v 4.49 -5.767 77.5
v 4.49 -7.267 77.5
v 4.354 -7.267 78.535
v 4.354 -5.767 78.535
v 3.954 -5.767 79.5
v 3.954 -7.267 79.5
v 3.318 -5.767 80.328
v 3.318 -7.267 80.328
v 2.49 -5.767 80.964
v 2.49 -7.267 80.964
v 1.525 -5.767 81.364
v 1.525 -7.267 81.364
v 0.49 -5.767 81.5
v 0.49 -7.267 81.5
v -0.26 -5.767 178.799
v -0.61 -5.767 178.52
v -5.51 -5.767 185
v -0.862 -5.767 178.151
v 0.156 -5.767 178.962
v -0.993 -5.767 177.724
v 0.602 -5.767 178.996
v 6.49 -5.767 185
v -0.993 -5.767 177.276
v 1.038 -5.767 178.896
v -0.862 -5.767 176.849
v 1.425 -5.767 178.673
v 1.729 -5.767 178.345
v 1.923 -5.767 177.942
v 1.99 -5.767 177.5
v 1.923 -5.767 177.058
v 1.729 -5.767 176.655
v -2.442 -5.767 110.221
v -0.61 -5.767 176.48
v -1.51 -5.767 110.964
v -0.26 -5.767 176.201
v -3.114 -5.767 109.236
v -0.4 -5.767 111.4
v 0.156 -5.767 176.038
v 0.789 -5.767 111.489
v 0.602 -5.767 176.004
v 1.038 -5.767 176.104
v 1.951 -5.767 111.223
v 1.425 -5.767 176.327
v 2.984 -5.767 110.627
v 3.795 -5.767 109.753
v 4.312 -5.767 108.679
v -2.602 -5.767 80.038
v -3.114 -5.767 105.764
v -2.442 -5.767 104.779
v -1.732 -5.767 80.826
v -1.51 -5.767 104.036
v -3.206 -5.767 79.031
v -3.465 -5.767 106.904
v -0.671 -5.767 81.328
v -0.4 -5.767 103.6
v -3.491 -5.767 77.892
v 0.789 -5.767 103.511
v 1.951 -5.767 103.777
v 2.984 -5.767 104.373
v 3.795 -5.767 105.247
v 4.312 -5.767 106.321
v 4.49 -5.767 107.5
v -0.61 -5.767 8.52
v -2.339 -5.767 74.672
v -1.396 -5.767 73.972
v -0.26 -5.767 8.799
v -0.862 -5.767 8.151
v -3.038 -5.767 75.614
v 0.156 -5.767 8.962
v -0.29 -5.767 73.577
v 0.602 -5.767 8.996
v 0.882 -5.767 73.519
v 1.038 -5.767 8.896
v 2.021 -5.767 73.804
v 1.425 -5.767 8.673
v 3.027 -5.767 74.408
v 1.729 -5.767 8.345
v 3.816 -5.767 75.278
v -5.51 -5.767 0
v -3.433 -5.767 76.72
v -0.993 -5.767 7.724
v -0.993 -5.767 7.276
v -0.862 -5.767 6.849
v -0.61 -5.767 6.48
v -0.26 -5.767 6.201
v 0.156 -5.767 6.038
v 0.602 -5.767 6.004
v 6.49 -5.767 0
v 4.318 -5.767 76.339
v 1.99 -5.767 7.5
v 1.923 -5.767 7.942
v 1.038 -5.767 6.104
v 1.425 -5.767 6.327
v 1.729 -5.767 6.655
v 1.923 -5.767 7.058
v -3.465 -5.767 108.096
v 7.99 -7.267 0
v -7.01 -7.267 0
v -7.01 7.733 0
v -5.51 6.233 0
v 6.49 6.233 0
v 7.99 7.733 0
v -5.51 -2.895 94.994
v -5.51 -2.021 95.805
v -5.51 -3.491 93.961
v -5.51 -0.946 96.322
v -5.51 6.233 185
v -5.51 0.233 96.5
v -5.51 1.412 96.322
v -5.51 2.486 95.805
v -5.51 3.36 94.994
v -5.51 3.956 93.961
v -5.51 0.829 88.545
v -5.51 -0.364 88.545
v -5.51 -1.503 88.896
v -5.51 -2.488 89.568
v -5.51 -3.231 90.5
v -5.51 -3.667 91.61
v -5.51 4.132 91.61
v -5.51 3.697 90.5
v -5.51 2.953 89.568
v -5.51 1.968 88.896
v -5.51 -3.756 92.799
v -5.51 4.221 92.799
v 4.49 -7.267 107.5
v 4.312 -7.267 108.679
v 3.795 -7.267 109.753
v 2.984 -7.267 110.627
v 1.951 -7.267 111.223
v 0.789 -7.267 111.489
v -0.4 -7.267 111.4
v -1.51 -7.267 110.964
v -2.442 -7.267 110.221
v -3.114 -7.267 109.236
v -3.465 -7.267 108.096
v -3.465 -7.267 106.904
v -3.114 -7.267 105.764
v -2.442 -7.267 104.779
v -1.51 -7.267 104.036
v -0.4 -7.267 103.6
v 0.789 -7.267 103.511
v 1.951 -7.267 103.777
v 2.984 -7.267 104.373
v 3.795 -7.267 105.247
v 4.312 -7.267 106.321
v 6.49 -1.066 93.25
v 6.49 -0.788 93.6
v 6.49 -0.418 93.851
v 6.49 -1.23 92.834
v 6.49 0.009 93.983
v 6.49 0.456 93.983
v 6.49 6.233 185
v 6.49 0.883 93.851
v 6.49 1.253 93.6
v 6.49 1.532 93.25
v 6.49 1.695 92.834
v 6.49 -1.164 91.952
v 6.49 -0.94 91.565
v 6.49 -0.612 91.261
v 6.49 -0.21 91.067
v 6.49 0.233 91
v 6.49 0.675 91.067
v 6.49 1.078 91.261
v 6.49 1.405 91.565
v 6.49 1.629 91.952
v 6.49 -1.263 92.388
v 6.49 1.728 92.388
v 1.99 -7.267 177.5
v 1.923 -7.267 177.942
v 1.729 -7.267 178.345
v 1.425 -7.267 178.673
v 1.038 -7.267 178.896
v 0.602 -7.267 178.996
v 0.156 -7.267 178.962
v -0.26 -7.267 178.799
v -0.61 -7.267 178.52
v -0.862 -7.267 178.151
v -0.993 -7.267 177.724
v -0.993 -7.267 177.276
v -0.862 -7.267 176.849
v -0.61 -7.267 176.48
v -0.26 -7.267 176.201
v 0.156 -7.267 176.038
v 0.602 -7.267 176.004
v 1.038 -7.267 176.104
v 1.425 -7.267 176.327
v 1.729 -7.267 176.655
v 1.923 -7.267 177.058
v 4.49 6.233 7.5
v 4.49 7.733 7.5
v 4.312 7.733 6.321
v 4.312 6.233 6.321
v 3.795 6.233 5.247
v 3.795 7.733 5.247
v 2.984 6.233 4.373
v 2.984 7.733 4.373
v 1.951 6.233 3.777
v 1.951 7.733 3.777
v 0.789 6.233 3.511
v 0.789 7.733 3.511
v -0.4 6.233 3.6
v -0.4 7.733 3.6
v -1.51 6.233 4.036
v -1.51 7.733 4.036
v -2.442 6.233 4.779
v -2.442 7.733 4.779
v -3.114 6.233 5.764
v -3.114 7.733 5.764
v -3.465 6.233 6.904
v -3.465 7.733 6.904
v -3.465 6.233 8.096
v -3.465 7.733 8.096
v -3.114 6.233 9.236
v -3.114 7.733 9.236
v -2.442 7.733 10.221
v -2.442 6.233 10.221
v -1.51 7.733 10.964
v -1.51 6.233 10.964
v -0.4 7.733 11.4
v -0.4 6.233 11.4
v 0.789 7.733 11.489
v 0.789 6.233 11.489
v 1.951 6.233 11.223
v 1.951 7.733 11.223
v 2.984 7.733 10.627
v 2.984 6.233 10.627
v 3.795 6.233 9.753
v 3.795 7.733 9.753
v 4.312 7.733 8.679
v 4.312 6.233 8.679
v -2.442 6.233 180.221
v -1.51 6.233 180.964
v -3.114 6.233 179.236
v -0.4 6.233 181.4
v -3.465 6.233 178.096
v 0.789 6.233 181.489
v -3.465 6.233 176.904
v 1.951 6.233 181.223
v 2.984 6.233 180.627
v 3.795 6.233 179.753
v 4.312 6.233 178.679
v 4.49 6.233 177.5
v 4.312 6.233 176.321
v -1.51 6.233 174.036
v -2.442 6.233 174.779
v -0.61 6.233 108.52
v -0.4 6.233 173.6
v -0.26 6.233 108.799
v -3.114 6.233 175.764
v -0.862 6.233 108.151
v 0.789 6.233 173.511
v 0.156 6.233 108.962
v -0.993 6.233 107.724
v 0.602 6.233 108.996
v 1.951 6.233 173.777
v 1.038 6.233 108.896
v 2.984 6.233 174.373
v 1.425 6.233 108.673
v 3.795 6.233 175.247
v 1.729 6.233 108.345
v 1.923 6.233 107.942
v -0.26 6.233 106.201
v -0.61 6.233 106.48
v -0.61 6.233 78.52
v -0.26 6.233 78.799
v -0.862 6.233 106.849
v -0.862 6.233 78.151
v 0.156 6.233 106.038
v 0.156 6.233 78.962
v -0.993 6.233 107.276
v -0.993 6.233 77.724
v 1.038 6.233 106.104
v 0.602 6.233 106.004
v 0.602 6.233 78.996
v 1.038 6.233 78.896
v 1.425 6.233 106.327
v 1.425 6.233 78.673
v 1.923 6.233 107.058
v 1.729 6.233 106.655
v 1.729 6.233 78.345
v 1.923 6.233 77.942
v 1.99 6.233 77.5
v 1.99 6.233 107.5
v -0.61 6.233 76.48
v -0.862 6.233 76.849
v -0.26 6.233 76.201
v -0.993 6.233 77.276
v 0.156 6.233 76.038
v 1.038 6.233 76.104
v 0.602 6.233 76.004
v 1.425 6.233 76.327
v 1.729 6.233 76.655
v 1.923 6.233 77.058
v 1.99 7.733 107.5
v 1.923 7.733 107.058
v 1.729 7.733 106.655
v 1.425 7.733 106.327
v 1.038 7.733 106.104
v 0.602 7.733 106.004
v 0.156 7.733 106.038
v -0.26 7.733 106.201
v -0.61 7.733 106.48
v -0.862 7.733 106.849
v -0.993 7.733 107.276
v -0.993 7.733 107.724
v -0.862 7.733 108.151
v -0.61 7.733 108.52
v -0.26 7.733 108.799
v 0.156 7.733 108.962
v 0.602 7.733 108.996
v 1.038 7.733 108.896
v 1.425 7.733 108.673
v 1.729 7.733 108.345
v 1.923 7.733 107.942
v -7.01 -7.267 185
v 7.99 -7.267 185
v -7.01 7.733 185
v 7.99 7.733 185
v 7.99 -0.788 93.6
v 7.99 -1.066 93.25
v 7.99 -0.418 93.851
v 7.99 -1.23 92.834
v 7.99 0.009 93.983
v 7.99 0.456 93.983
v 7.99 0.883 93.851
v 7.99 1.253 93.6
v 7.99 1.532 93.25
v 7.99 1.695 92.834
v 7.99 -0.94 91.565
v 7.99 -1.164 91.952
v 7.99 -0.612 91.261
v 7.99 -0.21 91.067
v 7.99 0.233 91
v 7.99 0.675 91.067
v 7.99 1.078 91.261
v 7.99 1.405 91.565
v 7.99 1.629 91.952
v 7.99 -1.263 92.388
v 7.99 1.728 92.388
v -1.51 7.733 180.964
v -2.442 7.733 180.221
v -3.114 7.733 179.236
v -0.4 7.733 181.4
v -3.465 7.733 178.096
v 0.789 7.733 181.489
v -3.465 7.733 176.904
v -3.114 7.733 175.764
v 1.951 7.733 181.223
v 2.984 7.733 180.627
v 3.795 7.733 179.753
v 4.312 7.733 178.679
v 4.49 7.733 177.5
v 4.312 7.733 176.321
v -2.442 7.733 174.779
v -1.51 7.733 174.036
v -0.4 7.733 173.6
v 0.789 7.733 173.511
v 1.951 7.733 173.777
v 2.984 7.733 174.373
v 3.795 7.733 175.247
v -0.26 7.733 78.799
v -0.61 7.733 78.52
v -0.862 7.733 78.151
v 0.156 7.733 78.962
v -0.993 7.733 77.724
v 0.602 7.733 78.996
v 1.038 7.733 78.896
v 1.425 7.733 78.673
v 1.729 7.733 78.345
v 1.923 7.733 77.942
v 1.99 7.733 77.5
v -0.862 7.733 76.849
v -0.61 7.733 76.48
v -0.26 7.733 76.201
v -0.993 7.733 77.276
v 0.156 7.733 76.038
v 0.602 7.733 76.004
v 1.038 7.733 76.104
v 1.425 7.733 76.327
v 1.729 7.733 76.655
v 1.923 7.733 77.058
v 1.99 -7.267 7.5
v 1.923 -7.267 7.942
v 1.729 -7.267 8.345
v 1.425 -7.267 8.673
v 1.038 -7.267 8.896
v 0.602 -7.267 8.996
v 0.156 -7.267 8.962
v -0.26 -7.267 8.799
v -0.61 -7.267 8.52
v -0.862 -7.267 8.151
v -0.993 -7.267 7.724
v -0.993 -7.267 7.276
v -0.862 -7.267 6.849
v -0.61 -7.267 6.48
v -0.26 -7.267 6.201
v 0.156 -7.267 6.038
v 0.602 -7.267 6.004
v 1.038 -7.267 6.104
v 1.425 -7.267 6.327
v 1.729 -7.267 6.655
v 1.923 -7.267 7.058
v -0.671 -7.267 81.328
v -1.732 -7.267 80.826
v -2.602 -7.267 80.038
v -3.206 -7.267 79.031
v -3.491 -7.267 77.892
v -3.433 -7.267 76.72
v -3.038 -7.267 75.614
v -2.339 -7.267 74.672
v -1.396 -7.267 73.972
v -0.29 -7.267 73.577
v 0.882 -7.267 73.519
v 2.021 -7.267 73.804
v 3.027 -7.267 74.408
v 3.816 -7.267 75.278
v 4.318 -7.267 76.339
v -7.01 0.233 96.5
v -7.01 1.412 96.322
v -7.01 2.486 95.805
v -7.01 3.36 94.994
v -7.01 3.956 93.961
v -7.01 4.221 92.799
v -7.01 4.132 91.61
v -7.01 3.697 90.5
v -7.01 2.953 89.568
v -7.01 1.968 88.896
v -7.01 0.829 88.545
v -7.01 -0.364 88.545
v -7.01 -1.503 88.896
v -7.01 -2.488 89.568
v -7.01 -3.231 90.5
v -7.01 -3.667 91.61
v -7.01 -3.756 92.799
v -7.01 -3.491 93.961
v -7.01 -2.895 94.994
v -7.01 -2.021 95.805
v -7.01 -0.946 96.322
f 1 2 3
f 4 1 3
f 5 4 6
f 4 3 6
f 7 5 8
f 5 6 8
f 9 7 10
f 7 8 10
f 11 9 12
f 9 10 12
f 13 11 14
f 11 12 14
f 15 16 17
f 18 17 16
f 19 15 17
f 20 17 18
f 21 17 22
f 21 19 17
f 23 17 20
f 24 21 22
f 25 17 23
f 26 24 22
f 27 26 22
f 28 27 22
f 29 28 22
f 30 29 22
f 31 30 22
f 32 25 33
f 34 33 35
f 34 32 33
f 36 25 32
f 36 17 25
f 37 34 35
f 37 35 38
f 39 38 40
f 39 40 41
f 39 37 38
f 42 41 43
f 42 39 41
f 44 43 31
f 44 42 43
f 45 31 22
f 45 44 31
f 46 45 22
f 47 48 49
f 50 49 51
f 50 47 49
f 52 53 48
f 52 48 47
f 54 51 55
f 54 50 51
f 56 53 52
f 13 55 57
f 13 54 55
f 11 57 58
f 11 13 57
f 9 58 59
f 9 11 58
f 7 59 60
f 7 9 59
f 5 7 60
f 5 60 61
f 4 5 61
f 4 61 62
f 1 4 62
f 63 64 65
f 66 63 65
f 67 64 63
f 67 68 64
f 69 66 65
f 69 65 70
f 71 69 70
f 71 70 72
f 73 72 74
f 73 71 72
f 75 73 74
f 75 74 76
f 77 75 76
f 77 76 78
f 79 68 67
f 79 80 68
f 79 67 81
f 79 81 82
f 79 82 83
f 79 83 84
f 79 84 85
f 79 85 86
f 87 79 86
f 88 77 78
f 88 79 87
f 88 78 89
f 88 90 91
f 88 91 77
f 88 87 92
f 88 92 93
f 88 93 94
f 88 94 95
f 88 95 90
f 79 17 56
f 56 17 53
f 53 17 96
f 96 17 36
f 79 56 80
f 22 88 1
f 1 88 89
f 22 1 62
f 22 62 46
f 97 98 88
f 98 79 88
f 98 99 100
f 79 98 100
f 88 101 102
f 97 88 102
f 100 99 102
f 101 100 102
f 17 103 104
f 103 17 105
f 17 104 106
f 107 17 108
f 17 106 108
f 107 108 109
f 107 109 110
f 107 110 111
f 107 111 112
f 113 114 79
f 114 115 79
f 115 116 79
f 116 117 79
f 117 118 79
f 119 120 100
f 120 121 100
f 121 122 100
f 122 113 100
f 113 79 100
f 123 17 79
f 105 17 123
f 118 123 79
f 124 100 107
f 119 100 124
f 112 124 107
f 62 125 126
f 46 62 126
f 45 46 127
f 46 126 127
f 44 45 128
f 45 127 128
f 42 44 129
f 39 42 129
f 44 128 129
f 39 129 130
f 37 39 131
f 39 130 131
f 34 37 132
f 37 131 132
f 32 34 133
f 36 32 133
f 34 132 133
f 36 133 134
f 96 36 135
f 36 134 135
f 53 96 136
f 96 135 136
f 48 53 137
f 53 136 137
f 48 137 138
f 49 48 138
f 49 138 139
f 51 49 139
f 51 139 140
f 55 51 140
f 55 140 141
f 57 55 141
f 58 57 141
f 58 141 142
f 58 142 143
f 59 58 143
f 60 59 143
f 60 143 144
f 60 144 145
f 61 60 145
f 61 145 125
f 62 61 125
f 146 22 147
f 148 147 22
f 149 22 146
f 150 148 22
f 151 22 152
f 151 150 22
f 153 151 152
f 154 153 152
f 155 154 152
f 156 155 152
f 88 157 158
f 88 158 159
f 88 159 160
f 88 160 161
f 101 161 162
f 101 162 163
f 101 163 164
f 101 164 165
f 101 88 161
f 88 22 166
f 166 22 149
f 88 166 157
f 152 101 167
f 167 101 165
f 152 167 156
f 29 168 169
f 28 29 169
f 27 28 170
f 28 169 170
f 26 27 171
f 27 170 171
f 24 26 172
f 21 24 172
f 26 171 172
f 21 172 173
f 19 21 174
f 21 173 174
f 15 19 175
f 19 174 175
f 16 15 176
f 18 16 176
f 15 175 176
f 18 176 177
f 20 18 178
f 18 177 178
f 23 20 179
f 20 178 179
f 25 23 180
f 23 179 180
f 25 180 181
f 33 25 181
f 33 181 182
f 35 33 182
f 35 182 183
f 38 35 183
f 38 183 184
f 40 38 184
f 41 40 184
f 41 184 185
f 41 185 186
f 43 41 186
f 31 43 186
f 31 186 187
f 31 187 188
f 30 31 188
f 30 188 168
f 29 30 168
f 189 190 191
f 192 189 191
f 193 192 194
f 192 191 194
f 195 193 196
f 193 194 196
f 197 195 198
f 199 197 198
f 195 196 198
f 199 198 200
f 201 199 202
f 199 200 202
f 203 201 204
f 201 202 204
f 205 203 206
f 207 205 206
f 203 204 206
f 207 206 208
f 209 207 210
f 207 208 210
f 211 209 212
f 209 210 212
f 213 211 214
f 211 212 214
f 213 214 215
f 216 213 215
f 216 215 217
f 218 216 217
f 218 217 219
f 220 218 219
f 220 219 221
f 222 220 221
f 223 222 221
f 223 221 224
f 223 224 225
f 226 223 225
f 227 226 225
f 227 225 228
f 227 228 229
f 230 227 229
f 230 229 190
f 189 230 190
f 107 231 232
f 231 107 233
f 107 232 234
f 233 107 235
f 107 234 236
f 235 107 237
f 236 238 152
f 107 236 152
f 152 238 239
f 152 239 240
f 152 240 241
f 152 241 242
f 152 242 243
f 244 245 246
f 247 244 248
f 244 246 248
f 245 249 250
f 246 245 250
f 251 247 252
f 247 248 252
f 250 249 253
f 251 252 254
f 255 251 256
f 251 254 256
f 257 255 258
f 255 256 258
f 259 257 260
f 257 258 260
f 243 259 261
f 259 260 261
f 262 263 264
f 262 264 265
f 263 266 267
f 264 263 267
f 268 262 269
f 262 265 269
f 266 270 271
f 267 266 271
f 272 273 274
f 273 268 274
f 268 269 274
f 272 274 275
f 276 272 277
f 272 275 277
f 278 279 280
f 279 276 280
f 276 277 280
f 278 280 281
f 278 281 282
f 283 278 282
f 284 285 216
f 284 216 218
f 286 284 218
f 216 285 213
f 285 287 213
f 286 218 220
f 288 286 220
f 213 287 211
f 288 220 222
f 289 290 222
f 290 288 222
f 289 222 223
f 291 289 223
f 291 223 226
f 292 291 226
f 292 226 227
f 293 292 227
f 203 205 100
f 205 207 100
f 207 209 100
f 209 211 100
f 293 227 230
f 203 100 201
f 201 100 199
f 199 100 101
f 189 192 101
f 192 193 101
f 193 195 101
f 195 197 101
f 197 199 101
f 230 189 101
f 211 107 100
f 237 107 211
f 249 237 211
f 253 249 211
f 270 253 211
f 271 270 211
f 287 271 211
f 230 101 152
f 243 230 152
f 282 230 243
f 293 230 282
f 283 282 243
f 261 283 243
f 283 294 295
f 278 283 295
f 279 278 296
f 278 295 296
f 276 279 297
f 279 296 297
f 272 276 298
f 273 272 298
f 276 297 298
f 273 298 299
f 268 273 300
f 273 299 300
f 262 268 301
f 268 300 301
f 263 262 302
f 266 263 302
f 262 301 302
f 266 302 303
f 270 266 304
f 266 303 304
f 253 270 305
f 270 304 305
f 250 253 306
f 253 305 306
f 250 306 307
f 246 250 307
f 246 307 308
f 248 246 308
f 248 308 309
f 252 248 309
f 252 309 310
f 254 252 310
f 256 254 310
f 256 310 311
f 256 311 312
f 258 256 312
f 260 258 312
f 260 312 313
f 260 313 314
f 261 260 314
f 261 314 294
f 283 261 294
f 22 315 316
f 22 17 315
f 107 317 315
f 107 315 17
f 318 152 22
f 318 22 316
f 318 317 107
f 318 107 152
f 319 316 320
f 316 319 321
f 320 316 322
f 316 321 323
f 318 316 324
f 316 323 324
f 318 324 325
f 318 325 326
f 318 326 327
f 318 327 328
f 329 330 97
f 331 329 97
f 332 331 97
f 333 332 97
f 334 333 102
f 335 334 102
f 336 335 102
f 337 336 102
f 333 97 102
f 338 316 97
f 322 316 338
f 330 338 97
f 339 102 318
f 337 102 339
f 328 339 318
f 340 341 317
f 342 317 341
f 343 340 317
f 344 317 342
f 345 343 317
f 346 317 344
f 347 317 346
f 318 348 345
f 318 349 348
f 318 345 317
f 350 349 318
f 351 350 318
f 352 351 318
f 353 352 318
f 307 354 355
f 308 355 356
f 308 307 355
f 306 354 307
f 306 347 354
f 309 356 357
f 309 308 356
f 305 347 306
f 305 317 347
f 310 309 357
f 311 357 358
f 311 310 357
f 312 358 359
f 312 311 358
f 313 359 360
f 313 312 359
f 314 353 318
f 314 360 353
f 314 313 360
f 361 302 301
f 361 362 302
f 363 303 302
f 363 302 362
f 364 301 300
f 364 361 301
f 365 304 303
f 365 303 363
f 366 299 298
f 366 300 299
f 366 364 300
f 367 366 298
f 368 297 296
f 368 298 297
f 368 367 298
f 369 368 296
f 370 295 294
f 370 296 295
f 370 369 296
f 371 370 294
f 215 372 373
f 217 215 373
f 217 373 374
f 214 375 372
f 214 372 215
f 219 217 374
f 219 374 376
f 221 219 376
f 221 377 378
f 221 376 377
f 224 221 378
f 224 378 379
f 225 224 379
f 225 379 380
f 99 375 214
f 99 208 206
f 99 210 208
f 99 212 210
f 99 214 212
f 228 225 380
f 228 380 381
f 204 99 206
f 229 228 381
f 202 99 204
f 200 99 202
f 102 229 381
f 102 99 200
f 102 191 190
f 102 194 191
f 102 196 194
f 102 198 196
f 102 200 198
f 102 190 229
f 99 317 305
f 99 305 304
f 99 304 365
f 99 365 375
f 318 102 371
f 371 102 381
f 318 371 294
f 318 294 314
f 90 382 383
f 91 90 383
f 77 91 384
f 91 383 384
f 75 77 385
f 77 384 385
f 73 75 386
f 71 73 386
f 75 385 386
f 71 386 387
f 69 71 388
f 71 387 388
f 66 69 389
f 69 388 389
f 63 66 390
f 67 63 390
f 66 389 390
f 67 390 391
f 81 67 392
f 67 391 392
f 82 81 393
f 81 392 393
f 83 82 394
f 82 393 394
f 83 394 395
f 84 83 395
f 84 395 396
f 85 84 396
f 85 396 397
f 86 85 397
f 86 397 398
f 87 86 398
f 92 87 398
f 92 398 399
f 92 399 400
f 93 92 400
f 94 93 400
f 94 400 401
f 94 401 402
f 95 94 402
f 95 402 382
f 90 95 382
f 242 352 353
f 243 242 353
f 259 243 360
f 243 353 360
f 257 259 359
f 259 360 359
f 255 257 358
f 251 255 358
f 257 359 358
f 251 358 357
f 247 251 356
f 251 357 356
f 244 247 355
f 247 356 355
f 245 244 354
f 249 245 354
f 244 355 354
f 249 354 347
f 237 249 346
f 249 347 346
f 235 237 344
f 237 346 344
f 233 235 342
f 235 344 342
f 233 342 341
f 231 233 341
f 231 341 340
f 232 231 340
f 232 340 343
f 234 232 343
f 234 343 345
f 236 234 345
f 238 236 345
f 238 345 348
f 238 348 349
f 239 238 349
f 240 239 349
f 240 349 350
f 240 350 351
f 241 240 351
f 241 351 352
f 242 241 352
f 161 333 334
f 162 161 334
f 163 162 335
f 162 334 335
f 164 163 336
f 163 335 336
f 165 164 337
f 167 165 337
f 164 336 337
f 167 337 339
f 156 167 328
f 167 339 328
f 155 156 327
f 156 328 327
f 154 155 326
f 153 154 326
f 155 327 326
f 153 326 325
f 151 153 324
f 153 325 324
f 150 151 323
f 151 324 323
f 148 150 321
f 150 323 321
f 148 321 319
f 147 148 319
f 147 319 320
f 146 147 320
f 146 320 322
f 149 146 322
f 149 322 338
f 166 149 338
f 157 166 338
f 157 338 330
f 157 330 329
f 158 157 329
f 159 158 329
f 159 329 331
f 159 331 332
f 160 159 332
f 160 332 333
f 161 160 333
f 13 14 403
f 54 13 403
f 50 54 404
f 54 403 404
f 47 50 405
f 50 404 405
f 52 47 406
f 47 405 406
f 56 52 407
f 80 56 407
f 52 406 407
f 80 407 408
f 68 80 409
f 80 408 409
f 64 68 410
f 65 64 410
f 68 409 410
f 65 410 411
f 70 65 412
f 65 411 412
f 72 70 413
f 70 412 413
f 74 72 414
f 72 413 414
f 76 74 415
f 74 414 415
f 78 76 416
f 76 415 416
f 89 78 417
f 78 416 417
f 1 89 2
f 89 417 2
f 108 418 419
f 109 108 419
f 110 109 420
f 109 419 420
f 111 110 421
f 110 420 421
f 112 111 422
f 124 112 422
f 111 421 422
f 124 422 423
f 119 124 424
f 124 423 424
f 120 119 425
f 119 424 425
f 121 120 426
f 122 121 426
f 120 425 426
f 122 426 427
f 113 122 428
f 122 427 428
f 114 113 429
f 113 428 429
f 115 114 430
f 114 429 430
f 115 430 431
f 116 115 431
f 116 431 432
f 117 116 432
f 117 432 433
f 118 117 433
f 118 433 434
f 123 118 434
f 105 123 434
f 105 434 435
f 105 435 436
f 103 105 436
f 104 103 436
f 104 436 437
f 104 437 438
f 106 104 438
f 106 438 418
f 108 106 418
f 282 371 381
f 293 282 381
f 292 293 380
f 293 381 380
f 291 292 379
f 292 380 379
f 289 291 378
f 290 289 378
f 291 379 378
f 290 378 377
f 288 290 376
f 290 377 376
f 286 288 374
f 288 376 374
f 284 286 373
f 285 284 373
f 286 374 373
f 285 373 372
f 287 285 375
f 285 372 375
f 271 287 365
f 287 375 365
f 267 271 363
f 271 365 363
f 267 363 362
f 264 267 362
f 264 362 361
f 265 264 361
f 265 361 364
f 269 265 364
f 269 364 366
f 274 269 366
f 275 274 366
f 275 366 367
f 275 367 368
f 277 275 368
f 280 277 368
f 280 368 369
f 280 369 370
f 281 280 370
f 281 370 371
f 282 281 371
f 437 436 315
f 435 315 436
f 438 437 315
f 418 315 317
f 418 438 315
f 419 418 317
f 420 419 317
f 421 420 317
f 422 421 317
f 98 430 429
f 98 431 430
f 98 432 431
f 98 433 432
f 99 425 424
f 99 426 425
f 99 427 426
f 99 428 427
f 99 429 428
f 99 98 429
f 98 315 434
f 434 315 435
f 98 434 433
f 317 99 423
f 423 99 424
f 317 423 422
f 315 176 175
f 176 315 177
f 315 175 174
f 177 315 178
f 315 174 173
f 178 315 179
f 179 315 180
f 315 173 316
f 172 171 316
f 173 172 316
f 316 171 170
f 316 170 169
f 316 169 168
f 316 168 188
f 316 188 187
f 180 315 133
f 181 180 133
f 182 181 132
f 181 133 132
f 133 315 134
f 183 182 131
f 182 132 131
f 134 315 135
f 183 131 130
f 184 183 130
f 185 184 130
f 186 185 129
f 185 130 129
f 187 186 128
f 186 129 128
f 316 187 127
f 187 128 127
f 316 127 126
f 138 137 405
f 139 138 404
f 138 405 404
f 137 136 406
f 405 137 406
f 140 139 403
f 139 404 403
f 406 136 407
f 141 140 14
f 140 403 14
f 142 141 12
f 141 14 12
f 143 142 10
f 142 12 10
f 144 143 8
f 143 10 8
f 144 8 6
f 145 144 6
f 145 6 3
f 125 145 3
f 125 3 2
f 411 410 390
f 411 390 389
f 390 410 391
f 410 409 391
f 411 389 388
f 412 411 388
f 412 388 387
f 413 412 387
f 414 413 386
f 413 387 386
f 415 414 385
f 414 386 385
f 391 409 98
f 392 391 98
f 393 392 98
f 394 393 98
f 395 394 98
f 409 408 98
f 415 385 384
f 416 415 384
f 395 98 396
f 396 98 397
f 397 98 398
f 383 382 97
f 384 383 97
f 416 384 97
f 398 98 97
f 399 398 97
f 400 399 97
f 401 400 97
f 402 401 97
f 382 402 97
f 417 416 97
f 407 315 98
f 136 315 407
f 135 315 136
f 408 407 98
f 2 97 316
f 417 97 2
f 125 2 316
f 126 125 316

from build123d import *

# Parameters (mm, degrees)
SKETCH_1_W           = 15
SKETCH_1_H           = 15
SKETCH_1_W_2         = 12
SKETCH_1_H_2         = 12
EXTRUDE_2_DEPTH      = 185
SKETCH_2_R           = 4
CUT_EXTRUDE_1_DEPTH  = 10
SKETCH_3_R           = 4
CUT_EXTRUDE_2_DEPTH  = 10
SKETCH_4_R           = 1.5
CUT_EXTRUDE_3_DEPTH  = 10
SKETCH_5_R           = 1.5
CUT_EXTRUDE_4_DEPTH  = 10
SKETCH_6_R           = 1.5
CUT_EXTRUDE_5_DEPTH  = 10
SKETCH_8_R           = 1.5
CUT_EXTRUDE_6_DEPTH  = 10
CUT_EXTRUDE_7_DEPTH  = 10
SKETCH_10_R          = 4
CUT_EXTRUDE_8_DEPTH  = 10
SKETCH_11_R          = 1.5
CUT_EXTRUDE_9_DEPTH  = 10
SKETCH_12_R          = 4
CUT_EXTRUDE_10_DEPTH = 10


with BuildPart() as part:
    # ｽｹｯﾁ1 → ﾎﾞｽ - 押し出し2 (new body)
    with BuildSketch(Plane.XY):
        with Locations((0.489915859, 0.232626086)):
            Rectangle(SKETCH_1_W, SKETCH_1_H)
        with Locations((0.489915859, 0.232626086)):
            Rectangle(SKETCH_1_W_2, SKETCH_1_H_2, mode=Mode.SUBTRACT)
    extrude(amount=EXTRUDE_2_DEPTH)

    # ｽｹｯﾁ2 → ｶｯﾄ - 押し出し1 (cut)
    with BuildSketch(Plane(origin=(0, 7.732626086, 0), x_dir=(1, 0, 0), z_dir=(0, 1, 0))):
        with Locations((0.489915859, -7.5)):
            Circle(SKETCH_2_R)
    extrude(amount=-CUT_EXTRUDE_1_DEPTH, mode=Mode.SUBTRACT)

    # ｽｹｯﾁ3 → ｶｯﾄ - 押し出し2 (cut)
    with BuildSketch(Plane(origin=(0, 7.732626086, 0), x_dir=(1, 0, 0), z_dir=(0, 1, 0))):
        with Locations((0.489915859, -177.5)):
            Circle(SKETCH_3_R)
    extrude(amount=-CUT_EXTRUDE_2_DEPTH, mode=Mode.SUBTRACT)

    # ｽｹｯﾁ4 → ｶｯﾄ - 押し出し3 (cut)
    with BuildSketch(Plane.XZ.offset(7.267373914)):
        with Locations((0.489915859, 7.5)):
            Circle(SKETCH_4_R)
    extrude(amount=-CUT_EXTRUDE_3_DEPTH, mode=Mode.SUBTRACT)

    # ｽｹｯﾁ5 → ｶｯﾄ - 押し出し4 (cut)
    with BuildSketch(Plane.XZ.offset(7.267373914)):
        with Locations((0.489915859, 177.5)):
            Circle(SKETCH_5_R)
    extrude(amount=-CUT_EXTRUDE_4_DEPTH, mode=Mode.SUBTRACT)

    # ｽｹｯﾁ6 → ｶｯﾄ - 押し出し5 (cut)
    with BuildSketch(Plane(origin=(0, 7.732626086, 0), x_dir=(1, 0, 0), z_dir=(0, 1, 0))):
        with Locations((0.489915859, -77.5)):
            Circle(SKETCH_6_R)
    extrude(amount=-CUT_EXTRUDE_5_DEPTH, mode=Mode.SUBTRACT)

    # ｽｹｯﾁ8 → ｶｯﾄ - 押し出し6 (cut)
    with BuildSketch(Plane(origin=(0, 7.732626086, 0), x_dir=(1, 0, 0), z_dir=(0, 1, 0))):
        with Locations((0.489915859, -107.5)):
            Circle(SKETCH_8_R)
    extrude(amount=-CUT_EXTRUDE_6_DEPTH, mode=Mode.SUBTRACT)

    # ｽｹｯﾁ9 → ｶｯﾄ - 押し出し7 (cut)
    with BuildSketch(Plane.XZ.offset(7.267373914)):
        with BuildLine():
            ThreePointArc((4.489915859, 77.5), (3.318342984, 80.328427125), (0.489915859, 81.5))
            Line((0.489915859, 81.5), (0.489915859, 77.5))
            Line((0.489915859, 77.5), (4.489915859, 77.5))
        make_face()
        with BuildLine():
            Line((0.489915859, 77.5), (0.489915859, 81.5))
            ThreePointArc((0.489915859, 81.5), (-2.338511265, 74.671572875), (4.489915859, 77.5))
            Line((4.489915859, 77.5), (0.489915859, 77.5))
        make_face()
    extrude(amount=-CUT_EXTRUDE_7_DEPTH, mode=Mode.SUBTRACT)

    # ｽｹｯﾁ10 → ｶｯﾄ - 押し出し8 (cut)
    with BuildSketch(Plane.XZ.offset(7.267373914)):
        with Locations((0.489915859, 107.5)):
            Circle(SKETCH_10_R)
    extrude(amount=-CUT_EXTRUDE_8_DEPTH, mode=Mode.SUBTRACT)

    # ｽｹｯﾁ11 → ｶｯﾄ - 押し出し9 (cut)
    with BuildSketch(Plane(origin=(7.989915859, 0, 0), x_dir=(0, 0, -1), z_dir=(1, 0, 0))):
        with Locations((-92.5, 0.232626086)):
            Circle(SKETCH_11_R)
    extrude(amount=-CUT_EXTRUDE_9_DEPTH, mode=Mode.SUBTRACT)

    # ｽｹｯﾁ12 → ｶｯﾄ - 押し出し10 (cut)
    with BuildSketch(Plane.ZY.offset(7.010084141)):
        with Locations((92.5, 0.232626086)):
            Circle(SKETCH_12_R)
    extrude(amount=-CUT_EXTRUDE_10_DEPTH, mode=Mode.SUBTRACT)


solid = part.part
